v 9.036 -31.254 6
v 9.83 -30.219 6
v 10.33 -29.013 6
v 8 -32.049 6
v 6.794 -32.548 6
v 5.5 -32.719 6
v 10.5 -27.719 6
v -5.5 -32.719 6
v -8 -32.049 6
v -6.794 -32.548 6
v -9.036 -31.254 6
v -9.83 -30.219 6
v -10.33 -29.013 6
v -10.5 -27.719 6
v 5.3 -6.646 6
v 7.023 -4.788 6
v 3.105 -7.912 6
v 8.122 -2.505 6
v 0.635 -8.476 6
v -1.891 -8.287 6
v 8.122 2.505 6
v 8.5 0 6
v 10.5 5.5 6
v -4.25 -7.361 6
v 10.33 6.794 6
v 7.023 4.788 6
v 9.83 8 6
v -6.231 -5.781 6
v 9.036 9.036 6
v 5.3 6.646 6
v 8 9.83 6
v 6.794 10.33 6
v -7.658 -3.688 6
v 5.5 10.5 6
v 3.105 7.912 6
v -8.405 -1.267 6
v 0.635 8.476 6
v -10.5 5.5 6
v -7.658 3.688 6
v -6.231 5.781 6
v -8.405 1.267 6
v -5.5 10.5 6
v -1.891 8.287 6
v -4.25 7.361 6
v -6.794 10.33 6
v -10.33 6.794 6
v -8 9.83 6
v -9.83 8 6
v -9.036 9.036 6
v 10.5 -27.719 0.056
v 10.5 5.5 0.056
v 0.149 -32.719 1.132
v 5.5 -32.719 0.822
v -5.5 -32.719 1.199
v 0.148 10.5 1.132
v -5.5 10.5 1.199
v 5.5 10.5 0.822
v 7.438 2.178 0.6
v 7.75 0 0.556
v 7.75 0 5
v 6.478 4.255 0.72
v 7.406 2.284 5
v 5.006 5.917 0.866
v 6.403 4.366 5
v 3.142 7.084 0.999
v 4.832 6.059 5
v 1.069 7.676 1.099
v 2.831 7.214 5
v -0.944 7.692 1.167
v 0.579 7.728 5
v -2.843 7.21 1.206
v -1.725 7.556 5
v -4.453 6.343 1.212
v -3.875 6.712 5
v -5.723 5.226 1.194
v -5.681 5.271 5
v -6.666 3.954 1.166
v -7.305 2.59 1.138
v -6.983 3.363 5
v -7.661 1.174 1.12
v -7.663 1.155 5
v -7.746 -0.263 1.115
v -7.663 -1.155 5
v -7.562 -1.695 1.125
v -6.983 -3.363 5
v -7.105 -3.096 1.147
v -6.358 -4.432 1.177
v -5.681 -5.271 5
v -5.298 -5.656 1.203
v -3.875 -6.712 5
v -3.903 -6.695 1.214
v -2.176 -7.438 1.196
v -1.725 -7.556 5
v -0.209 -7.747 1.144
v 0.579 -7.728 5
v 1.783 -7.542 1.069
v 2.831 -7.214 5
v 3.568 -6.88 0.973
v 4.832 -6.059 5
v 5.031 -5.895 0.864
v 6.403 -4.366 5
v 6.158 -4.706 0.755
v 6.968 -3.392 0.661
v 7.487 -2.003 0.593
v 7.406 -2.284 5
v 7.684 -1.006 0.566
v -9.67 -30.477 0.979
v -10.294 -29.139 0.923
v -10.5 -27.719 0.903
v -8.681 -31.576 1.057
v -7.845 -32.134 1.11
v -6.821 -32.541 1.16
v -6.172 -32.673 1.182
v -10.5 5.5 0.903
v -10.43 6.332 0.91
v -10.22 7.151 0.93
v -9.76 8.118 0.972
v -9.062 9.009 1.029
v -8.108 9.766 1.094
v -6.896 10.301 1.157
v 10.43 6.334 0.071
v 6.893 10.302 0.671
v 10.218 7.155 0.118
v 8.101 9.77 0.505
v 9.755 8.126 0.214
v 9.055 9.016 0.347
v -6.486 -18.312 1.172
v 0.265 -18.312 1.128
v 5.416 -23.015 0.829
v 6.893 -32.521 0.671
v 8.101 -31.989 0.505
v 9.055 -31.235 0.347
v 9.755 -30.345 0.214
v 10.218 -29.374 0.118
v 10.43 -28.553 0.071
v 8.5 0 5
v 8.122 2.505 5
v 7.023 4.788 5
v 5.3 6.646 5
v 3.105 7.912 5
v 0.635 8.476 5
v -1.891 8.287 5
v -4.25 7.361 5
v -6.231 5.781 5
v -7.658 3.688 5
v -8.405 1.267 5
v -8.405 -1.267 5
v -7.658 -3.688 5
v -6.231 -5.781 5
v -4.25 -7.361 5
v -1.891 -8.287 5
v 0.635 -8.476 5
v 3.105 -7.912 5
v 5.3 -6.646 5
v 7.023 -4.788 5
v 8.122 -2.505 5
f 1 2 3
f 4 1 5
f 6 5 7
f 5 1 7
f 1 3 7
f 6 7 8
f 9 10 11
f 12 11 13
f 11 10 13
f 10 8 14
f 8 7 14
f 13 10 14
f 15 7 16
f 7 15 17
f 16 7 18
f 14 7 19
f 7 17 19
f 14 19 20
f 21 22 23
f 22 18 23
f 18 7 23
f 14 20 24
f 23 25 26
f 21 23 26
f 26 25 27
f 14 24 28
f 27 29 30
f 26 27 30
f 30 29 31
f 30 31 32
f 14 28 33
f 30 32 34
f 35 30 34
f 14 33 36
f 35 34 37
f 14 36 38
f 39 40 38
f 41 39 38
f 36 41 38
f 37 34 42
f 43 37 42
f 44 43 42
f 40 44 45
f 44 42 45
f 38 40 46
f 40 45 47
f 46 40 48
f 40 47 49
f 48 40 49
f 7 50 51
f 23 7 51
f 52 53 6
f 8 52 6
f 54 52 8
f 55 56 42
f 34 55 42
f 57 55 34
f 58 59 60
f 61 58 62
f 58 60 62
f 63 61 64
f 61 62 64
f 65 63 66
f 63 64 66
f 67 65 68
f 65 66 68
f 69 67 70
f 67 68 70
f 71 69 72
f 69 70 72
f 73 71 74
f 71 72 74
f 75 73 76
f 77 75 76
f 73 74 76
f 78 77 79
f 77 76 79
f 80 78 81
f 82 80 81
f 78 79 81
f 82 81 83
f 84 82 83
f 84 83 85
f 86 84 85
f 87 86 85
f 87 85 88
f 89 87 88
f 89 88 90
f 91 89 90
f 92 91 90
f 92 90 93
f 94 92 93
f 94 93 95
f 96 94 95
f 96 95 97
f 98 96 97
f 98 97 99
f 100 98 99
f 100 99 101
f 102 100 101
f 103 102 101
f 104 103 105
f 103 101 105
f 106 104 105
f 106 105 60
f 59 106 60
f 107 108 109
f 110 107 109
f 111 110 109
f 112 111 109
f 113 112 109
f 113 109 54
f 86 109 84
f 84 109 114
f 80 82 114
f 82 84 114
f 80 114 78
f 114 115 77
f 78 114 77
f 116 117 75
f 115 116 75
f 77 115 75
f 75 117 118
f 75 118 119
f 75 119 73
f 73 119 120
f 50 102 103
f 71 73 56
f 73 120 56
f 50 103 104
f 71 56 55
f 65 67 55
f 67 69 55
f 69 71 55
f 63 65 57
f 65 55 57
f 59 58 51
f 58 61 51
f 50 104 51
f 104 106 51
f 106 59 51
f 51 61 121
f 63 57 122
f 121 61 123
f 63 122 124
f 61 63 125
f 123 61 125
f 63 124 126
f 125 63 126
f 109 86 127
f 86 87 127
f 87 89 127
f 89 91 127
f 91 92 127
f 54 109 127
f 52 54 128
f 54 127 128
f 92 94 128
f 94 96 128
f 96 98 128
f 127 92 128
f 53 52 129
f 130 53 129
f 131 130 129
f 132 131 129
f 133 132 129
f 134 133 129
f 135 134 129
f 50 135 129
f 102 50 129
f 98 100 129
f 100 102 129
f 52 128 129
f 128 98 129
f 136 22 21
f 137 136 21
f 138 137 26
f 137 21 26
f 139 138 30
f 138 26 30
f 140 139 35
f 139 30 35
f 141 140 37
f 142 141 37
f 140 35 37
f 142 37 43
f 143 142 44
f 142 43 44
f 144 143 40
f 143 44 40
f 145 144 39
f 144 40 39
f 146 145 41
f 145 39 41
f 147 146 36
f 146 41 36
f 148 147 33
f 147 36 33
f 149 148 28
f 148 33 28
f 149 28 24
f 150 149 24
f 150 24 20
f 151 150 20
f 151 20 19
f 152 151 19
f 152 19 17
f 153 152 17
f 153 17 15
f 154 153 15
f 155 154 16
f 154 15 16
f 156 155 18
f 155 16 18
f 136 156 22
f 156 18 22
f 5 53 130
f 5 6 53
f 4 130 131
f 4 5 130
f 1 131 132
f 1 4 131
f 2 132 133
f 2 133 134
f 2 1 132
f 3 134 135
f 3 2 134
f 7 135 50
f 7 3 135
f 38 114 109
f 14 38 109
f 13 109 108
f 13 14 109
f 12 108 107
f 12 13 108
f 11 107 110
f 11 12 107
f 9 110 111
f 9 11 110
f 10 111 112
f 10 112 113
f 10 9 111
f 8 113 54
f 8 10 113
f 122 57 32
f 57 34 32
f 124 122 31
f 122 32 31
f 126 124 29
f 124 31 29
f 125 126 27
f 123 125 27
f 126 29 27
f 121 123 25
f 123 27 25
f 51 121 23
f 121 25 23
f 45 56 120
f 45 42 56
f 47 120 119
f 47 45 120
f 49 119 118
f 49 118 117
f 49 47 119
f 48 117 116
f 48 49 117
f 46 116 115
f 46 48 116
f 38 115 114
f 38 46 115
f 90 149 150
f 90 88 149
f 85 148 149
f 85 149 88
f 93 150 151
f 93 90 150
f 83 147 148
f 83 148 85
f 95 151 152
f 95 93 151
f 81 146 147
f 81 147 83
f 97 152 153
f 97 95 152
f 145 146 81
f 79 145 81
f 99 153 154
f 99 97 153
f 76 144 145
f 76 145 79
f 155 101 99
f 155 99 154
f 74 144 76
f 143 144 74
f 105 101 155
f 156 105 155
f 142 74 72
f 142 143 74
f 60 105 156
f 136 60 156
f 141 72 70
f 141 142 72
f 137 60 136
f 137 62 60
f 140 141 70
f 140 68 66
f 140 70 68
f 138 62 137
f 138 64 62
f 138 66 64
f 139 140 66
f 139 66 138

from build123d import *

# Parameters (mm, degrees)
EXTRUDE_1_DEPTH     = 6
CUT_EXTRUDE_5_DEPTH = 45.878603962
SKETCH_4_R          = 7.75
CUT_EXTRUDE_6_DEPTH = 35.872445467
FILLET_1_R          = 5
SKETCH_5_R          = 8.5
CUT_EXTRUDE_7_DEPTH = 1


with BuildPart() as part:
    # 草图1 → 凸台-拉伸1 (new body)
    with BuildSketch(Plane.XY):
        Polygon((-10.499999762, 10.5), (10.500000238, 10.5), (10.500000238, -10.500000475), (10.500000238, -32.718504007), (-10.499999762, -32.718504007), (-10.499999762, -10.499999525), align=None)
    extrude(amount=EXTRUDE_1_DEPTH)

    # 草图8 → 切除-拉伸5 (cut, through all)
    with BuildSketch(Plane(origin=(0, 10.5, 0), x_dir=(1, 0, 0), z_dir=(0, 1, 0))):
        with BuildLine():
            Line((-19.020487649, 0.47662404), (13.656545029, 0.844180338))
            add(Edge.make_bspline(
                [(-19.020487649, 0.47662404), (-14.907938577, -0.444262453), (-8.455698153, -1.333893864), (2.536876626, -1.118098726), (9.340479573, -0.673611335), (13.656545029, 0.844180338)],
                knots=[0, 0, 0, 0, 0.38369485, 0.588358138, 1, 1, 1, 1], degree=3))
        make_face()
    extrude(amount=-CUT_EXTRUDE_5_DEPTH, mode=Mode.SUBTRACT)

    # 草图4 → 切除-拉伸6 (cut, through all)
    with BuildSketch(Plane.XY.offset(6)):
        Circle(SKETCH_4_R)
    extrude(amount=-CUT_EXTRUDE_6_DEPTH, mode=Mode.SUBTRACT)

    # 圆角1
    fillet_1_edges = [part.edges().sort_by_distance(p)[0] for p in [
        (-10.499999762, -32.718504007, 3.451578548),
        (10.500000238, -32.718504007, 3.027756169),
        (10.500000238, 10.5, 3.027756169),
        (-10.499999762, 10.5, 3.451578548),
    ]]
    fillet(fillet_1_edges, radius=FILLET_1_R)

    # 草图5 → 切除-拉伸7 (cut)
    with BuildSketch(Plane.XY.offset(6)):
        Circle(SKETCH_5_R)
    extrude(amount=-CUT_EXTRUDE_7_DEPTH, mode=Mode.SUBTRACT)


solid = part.part
